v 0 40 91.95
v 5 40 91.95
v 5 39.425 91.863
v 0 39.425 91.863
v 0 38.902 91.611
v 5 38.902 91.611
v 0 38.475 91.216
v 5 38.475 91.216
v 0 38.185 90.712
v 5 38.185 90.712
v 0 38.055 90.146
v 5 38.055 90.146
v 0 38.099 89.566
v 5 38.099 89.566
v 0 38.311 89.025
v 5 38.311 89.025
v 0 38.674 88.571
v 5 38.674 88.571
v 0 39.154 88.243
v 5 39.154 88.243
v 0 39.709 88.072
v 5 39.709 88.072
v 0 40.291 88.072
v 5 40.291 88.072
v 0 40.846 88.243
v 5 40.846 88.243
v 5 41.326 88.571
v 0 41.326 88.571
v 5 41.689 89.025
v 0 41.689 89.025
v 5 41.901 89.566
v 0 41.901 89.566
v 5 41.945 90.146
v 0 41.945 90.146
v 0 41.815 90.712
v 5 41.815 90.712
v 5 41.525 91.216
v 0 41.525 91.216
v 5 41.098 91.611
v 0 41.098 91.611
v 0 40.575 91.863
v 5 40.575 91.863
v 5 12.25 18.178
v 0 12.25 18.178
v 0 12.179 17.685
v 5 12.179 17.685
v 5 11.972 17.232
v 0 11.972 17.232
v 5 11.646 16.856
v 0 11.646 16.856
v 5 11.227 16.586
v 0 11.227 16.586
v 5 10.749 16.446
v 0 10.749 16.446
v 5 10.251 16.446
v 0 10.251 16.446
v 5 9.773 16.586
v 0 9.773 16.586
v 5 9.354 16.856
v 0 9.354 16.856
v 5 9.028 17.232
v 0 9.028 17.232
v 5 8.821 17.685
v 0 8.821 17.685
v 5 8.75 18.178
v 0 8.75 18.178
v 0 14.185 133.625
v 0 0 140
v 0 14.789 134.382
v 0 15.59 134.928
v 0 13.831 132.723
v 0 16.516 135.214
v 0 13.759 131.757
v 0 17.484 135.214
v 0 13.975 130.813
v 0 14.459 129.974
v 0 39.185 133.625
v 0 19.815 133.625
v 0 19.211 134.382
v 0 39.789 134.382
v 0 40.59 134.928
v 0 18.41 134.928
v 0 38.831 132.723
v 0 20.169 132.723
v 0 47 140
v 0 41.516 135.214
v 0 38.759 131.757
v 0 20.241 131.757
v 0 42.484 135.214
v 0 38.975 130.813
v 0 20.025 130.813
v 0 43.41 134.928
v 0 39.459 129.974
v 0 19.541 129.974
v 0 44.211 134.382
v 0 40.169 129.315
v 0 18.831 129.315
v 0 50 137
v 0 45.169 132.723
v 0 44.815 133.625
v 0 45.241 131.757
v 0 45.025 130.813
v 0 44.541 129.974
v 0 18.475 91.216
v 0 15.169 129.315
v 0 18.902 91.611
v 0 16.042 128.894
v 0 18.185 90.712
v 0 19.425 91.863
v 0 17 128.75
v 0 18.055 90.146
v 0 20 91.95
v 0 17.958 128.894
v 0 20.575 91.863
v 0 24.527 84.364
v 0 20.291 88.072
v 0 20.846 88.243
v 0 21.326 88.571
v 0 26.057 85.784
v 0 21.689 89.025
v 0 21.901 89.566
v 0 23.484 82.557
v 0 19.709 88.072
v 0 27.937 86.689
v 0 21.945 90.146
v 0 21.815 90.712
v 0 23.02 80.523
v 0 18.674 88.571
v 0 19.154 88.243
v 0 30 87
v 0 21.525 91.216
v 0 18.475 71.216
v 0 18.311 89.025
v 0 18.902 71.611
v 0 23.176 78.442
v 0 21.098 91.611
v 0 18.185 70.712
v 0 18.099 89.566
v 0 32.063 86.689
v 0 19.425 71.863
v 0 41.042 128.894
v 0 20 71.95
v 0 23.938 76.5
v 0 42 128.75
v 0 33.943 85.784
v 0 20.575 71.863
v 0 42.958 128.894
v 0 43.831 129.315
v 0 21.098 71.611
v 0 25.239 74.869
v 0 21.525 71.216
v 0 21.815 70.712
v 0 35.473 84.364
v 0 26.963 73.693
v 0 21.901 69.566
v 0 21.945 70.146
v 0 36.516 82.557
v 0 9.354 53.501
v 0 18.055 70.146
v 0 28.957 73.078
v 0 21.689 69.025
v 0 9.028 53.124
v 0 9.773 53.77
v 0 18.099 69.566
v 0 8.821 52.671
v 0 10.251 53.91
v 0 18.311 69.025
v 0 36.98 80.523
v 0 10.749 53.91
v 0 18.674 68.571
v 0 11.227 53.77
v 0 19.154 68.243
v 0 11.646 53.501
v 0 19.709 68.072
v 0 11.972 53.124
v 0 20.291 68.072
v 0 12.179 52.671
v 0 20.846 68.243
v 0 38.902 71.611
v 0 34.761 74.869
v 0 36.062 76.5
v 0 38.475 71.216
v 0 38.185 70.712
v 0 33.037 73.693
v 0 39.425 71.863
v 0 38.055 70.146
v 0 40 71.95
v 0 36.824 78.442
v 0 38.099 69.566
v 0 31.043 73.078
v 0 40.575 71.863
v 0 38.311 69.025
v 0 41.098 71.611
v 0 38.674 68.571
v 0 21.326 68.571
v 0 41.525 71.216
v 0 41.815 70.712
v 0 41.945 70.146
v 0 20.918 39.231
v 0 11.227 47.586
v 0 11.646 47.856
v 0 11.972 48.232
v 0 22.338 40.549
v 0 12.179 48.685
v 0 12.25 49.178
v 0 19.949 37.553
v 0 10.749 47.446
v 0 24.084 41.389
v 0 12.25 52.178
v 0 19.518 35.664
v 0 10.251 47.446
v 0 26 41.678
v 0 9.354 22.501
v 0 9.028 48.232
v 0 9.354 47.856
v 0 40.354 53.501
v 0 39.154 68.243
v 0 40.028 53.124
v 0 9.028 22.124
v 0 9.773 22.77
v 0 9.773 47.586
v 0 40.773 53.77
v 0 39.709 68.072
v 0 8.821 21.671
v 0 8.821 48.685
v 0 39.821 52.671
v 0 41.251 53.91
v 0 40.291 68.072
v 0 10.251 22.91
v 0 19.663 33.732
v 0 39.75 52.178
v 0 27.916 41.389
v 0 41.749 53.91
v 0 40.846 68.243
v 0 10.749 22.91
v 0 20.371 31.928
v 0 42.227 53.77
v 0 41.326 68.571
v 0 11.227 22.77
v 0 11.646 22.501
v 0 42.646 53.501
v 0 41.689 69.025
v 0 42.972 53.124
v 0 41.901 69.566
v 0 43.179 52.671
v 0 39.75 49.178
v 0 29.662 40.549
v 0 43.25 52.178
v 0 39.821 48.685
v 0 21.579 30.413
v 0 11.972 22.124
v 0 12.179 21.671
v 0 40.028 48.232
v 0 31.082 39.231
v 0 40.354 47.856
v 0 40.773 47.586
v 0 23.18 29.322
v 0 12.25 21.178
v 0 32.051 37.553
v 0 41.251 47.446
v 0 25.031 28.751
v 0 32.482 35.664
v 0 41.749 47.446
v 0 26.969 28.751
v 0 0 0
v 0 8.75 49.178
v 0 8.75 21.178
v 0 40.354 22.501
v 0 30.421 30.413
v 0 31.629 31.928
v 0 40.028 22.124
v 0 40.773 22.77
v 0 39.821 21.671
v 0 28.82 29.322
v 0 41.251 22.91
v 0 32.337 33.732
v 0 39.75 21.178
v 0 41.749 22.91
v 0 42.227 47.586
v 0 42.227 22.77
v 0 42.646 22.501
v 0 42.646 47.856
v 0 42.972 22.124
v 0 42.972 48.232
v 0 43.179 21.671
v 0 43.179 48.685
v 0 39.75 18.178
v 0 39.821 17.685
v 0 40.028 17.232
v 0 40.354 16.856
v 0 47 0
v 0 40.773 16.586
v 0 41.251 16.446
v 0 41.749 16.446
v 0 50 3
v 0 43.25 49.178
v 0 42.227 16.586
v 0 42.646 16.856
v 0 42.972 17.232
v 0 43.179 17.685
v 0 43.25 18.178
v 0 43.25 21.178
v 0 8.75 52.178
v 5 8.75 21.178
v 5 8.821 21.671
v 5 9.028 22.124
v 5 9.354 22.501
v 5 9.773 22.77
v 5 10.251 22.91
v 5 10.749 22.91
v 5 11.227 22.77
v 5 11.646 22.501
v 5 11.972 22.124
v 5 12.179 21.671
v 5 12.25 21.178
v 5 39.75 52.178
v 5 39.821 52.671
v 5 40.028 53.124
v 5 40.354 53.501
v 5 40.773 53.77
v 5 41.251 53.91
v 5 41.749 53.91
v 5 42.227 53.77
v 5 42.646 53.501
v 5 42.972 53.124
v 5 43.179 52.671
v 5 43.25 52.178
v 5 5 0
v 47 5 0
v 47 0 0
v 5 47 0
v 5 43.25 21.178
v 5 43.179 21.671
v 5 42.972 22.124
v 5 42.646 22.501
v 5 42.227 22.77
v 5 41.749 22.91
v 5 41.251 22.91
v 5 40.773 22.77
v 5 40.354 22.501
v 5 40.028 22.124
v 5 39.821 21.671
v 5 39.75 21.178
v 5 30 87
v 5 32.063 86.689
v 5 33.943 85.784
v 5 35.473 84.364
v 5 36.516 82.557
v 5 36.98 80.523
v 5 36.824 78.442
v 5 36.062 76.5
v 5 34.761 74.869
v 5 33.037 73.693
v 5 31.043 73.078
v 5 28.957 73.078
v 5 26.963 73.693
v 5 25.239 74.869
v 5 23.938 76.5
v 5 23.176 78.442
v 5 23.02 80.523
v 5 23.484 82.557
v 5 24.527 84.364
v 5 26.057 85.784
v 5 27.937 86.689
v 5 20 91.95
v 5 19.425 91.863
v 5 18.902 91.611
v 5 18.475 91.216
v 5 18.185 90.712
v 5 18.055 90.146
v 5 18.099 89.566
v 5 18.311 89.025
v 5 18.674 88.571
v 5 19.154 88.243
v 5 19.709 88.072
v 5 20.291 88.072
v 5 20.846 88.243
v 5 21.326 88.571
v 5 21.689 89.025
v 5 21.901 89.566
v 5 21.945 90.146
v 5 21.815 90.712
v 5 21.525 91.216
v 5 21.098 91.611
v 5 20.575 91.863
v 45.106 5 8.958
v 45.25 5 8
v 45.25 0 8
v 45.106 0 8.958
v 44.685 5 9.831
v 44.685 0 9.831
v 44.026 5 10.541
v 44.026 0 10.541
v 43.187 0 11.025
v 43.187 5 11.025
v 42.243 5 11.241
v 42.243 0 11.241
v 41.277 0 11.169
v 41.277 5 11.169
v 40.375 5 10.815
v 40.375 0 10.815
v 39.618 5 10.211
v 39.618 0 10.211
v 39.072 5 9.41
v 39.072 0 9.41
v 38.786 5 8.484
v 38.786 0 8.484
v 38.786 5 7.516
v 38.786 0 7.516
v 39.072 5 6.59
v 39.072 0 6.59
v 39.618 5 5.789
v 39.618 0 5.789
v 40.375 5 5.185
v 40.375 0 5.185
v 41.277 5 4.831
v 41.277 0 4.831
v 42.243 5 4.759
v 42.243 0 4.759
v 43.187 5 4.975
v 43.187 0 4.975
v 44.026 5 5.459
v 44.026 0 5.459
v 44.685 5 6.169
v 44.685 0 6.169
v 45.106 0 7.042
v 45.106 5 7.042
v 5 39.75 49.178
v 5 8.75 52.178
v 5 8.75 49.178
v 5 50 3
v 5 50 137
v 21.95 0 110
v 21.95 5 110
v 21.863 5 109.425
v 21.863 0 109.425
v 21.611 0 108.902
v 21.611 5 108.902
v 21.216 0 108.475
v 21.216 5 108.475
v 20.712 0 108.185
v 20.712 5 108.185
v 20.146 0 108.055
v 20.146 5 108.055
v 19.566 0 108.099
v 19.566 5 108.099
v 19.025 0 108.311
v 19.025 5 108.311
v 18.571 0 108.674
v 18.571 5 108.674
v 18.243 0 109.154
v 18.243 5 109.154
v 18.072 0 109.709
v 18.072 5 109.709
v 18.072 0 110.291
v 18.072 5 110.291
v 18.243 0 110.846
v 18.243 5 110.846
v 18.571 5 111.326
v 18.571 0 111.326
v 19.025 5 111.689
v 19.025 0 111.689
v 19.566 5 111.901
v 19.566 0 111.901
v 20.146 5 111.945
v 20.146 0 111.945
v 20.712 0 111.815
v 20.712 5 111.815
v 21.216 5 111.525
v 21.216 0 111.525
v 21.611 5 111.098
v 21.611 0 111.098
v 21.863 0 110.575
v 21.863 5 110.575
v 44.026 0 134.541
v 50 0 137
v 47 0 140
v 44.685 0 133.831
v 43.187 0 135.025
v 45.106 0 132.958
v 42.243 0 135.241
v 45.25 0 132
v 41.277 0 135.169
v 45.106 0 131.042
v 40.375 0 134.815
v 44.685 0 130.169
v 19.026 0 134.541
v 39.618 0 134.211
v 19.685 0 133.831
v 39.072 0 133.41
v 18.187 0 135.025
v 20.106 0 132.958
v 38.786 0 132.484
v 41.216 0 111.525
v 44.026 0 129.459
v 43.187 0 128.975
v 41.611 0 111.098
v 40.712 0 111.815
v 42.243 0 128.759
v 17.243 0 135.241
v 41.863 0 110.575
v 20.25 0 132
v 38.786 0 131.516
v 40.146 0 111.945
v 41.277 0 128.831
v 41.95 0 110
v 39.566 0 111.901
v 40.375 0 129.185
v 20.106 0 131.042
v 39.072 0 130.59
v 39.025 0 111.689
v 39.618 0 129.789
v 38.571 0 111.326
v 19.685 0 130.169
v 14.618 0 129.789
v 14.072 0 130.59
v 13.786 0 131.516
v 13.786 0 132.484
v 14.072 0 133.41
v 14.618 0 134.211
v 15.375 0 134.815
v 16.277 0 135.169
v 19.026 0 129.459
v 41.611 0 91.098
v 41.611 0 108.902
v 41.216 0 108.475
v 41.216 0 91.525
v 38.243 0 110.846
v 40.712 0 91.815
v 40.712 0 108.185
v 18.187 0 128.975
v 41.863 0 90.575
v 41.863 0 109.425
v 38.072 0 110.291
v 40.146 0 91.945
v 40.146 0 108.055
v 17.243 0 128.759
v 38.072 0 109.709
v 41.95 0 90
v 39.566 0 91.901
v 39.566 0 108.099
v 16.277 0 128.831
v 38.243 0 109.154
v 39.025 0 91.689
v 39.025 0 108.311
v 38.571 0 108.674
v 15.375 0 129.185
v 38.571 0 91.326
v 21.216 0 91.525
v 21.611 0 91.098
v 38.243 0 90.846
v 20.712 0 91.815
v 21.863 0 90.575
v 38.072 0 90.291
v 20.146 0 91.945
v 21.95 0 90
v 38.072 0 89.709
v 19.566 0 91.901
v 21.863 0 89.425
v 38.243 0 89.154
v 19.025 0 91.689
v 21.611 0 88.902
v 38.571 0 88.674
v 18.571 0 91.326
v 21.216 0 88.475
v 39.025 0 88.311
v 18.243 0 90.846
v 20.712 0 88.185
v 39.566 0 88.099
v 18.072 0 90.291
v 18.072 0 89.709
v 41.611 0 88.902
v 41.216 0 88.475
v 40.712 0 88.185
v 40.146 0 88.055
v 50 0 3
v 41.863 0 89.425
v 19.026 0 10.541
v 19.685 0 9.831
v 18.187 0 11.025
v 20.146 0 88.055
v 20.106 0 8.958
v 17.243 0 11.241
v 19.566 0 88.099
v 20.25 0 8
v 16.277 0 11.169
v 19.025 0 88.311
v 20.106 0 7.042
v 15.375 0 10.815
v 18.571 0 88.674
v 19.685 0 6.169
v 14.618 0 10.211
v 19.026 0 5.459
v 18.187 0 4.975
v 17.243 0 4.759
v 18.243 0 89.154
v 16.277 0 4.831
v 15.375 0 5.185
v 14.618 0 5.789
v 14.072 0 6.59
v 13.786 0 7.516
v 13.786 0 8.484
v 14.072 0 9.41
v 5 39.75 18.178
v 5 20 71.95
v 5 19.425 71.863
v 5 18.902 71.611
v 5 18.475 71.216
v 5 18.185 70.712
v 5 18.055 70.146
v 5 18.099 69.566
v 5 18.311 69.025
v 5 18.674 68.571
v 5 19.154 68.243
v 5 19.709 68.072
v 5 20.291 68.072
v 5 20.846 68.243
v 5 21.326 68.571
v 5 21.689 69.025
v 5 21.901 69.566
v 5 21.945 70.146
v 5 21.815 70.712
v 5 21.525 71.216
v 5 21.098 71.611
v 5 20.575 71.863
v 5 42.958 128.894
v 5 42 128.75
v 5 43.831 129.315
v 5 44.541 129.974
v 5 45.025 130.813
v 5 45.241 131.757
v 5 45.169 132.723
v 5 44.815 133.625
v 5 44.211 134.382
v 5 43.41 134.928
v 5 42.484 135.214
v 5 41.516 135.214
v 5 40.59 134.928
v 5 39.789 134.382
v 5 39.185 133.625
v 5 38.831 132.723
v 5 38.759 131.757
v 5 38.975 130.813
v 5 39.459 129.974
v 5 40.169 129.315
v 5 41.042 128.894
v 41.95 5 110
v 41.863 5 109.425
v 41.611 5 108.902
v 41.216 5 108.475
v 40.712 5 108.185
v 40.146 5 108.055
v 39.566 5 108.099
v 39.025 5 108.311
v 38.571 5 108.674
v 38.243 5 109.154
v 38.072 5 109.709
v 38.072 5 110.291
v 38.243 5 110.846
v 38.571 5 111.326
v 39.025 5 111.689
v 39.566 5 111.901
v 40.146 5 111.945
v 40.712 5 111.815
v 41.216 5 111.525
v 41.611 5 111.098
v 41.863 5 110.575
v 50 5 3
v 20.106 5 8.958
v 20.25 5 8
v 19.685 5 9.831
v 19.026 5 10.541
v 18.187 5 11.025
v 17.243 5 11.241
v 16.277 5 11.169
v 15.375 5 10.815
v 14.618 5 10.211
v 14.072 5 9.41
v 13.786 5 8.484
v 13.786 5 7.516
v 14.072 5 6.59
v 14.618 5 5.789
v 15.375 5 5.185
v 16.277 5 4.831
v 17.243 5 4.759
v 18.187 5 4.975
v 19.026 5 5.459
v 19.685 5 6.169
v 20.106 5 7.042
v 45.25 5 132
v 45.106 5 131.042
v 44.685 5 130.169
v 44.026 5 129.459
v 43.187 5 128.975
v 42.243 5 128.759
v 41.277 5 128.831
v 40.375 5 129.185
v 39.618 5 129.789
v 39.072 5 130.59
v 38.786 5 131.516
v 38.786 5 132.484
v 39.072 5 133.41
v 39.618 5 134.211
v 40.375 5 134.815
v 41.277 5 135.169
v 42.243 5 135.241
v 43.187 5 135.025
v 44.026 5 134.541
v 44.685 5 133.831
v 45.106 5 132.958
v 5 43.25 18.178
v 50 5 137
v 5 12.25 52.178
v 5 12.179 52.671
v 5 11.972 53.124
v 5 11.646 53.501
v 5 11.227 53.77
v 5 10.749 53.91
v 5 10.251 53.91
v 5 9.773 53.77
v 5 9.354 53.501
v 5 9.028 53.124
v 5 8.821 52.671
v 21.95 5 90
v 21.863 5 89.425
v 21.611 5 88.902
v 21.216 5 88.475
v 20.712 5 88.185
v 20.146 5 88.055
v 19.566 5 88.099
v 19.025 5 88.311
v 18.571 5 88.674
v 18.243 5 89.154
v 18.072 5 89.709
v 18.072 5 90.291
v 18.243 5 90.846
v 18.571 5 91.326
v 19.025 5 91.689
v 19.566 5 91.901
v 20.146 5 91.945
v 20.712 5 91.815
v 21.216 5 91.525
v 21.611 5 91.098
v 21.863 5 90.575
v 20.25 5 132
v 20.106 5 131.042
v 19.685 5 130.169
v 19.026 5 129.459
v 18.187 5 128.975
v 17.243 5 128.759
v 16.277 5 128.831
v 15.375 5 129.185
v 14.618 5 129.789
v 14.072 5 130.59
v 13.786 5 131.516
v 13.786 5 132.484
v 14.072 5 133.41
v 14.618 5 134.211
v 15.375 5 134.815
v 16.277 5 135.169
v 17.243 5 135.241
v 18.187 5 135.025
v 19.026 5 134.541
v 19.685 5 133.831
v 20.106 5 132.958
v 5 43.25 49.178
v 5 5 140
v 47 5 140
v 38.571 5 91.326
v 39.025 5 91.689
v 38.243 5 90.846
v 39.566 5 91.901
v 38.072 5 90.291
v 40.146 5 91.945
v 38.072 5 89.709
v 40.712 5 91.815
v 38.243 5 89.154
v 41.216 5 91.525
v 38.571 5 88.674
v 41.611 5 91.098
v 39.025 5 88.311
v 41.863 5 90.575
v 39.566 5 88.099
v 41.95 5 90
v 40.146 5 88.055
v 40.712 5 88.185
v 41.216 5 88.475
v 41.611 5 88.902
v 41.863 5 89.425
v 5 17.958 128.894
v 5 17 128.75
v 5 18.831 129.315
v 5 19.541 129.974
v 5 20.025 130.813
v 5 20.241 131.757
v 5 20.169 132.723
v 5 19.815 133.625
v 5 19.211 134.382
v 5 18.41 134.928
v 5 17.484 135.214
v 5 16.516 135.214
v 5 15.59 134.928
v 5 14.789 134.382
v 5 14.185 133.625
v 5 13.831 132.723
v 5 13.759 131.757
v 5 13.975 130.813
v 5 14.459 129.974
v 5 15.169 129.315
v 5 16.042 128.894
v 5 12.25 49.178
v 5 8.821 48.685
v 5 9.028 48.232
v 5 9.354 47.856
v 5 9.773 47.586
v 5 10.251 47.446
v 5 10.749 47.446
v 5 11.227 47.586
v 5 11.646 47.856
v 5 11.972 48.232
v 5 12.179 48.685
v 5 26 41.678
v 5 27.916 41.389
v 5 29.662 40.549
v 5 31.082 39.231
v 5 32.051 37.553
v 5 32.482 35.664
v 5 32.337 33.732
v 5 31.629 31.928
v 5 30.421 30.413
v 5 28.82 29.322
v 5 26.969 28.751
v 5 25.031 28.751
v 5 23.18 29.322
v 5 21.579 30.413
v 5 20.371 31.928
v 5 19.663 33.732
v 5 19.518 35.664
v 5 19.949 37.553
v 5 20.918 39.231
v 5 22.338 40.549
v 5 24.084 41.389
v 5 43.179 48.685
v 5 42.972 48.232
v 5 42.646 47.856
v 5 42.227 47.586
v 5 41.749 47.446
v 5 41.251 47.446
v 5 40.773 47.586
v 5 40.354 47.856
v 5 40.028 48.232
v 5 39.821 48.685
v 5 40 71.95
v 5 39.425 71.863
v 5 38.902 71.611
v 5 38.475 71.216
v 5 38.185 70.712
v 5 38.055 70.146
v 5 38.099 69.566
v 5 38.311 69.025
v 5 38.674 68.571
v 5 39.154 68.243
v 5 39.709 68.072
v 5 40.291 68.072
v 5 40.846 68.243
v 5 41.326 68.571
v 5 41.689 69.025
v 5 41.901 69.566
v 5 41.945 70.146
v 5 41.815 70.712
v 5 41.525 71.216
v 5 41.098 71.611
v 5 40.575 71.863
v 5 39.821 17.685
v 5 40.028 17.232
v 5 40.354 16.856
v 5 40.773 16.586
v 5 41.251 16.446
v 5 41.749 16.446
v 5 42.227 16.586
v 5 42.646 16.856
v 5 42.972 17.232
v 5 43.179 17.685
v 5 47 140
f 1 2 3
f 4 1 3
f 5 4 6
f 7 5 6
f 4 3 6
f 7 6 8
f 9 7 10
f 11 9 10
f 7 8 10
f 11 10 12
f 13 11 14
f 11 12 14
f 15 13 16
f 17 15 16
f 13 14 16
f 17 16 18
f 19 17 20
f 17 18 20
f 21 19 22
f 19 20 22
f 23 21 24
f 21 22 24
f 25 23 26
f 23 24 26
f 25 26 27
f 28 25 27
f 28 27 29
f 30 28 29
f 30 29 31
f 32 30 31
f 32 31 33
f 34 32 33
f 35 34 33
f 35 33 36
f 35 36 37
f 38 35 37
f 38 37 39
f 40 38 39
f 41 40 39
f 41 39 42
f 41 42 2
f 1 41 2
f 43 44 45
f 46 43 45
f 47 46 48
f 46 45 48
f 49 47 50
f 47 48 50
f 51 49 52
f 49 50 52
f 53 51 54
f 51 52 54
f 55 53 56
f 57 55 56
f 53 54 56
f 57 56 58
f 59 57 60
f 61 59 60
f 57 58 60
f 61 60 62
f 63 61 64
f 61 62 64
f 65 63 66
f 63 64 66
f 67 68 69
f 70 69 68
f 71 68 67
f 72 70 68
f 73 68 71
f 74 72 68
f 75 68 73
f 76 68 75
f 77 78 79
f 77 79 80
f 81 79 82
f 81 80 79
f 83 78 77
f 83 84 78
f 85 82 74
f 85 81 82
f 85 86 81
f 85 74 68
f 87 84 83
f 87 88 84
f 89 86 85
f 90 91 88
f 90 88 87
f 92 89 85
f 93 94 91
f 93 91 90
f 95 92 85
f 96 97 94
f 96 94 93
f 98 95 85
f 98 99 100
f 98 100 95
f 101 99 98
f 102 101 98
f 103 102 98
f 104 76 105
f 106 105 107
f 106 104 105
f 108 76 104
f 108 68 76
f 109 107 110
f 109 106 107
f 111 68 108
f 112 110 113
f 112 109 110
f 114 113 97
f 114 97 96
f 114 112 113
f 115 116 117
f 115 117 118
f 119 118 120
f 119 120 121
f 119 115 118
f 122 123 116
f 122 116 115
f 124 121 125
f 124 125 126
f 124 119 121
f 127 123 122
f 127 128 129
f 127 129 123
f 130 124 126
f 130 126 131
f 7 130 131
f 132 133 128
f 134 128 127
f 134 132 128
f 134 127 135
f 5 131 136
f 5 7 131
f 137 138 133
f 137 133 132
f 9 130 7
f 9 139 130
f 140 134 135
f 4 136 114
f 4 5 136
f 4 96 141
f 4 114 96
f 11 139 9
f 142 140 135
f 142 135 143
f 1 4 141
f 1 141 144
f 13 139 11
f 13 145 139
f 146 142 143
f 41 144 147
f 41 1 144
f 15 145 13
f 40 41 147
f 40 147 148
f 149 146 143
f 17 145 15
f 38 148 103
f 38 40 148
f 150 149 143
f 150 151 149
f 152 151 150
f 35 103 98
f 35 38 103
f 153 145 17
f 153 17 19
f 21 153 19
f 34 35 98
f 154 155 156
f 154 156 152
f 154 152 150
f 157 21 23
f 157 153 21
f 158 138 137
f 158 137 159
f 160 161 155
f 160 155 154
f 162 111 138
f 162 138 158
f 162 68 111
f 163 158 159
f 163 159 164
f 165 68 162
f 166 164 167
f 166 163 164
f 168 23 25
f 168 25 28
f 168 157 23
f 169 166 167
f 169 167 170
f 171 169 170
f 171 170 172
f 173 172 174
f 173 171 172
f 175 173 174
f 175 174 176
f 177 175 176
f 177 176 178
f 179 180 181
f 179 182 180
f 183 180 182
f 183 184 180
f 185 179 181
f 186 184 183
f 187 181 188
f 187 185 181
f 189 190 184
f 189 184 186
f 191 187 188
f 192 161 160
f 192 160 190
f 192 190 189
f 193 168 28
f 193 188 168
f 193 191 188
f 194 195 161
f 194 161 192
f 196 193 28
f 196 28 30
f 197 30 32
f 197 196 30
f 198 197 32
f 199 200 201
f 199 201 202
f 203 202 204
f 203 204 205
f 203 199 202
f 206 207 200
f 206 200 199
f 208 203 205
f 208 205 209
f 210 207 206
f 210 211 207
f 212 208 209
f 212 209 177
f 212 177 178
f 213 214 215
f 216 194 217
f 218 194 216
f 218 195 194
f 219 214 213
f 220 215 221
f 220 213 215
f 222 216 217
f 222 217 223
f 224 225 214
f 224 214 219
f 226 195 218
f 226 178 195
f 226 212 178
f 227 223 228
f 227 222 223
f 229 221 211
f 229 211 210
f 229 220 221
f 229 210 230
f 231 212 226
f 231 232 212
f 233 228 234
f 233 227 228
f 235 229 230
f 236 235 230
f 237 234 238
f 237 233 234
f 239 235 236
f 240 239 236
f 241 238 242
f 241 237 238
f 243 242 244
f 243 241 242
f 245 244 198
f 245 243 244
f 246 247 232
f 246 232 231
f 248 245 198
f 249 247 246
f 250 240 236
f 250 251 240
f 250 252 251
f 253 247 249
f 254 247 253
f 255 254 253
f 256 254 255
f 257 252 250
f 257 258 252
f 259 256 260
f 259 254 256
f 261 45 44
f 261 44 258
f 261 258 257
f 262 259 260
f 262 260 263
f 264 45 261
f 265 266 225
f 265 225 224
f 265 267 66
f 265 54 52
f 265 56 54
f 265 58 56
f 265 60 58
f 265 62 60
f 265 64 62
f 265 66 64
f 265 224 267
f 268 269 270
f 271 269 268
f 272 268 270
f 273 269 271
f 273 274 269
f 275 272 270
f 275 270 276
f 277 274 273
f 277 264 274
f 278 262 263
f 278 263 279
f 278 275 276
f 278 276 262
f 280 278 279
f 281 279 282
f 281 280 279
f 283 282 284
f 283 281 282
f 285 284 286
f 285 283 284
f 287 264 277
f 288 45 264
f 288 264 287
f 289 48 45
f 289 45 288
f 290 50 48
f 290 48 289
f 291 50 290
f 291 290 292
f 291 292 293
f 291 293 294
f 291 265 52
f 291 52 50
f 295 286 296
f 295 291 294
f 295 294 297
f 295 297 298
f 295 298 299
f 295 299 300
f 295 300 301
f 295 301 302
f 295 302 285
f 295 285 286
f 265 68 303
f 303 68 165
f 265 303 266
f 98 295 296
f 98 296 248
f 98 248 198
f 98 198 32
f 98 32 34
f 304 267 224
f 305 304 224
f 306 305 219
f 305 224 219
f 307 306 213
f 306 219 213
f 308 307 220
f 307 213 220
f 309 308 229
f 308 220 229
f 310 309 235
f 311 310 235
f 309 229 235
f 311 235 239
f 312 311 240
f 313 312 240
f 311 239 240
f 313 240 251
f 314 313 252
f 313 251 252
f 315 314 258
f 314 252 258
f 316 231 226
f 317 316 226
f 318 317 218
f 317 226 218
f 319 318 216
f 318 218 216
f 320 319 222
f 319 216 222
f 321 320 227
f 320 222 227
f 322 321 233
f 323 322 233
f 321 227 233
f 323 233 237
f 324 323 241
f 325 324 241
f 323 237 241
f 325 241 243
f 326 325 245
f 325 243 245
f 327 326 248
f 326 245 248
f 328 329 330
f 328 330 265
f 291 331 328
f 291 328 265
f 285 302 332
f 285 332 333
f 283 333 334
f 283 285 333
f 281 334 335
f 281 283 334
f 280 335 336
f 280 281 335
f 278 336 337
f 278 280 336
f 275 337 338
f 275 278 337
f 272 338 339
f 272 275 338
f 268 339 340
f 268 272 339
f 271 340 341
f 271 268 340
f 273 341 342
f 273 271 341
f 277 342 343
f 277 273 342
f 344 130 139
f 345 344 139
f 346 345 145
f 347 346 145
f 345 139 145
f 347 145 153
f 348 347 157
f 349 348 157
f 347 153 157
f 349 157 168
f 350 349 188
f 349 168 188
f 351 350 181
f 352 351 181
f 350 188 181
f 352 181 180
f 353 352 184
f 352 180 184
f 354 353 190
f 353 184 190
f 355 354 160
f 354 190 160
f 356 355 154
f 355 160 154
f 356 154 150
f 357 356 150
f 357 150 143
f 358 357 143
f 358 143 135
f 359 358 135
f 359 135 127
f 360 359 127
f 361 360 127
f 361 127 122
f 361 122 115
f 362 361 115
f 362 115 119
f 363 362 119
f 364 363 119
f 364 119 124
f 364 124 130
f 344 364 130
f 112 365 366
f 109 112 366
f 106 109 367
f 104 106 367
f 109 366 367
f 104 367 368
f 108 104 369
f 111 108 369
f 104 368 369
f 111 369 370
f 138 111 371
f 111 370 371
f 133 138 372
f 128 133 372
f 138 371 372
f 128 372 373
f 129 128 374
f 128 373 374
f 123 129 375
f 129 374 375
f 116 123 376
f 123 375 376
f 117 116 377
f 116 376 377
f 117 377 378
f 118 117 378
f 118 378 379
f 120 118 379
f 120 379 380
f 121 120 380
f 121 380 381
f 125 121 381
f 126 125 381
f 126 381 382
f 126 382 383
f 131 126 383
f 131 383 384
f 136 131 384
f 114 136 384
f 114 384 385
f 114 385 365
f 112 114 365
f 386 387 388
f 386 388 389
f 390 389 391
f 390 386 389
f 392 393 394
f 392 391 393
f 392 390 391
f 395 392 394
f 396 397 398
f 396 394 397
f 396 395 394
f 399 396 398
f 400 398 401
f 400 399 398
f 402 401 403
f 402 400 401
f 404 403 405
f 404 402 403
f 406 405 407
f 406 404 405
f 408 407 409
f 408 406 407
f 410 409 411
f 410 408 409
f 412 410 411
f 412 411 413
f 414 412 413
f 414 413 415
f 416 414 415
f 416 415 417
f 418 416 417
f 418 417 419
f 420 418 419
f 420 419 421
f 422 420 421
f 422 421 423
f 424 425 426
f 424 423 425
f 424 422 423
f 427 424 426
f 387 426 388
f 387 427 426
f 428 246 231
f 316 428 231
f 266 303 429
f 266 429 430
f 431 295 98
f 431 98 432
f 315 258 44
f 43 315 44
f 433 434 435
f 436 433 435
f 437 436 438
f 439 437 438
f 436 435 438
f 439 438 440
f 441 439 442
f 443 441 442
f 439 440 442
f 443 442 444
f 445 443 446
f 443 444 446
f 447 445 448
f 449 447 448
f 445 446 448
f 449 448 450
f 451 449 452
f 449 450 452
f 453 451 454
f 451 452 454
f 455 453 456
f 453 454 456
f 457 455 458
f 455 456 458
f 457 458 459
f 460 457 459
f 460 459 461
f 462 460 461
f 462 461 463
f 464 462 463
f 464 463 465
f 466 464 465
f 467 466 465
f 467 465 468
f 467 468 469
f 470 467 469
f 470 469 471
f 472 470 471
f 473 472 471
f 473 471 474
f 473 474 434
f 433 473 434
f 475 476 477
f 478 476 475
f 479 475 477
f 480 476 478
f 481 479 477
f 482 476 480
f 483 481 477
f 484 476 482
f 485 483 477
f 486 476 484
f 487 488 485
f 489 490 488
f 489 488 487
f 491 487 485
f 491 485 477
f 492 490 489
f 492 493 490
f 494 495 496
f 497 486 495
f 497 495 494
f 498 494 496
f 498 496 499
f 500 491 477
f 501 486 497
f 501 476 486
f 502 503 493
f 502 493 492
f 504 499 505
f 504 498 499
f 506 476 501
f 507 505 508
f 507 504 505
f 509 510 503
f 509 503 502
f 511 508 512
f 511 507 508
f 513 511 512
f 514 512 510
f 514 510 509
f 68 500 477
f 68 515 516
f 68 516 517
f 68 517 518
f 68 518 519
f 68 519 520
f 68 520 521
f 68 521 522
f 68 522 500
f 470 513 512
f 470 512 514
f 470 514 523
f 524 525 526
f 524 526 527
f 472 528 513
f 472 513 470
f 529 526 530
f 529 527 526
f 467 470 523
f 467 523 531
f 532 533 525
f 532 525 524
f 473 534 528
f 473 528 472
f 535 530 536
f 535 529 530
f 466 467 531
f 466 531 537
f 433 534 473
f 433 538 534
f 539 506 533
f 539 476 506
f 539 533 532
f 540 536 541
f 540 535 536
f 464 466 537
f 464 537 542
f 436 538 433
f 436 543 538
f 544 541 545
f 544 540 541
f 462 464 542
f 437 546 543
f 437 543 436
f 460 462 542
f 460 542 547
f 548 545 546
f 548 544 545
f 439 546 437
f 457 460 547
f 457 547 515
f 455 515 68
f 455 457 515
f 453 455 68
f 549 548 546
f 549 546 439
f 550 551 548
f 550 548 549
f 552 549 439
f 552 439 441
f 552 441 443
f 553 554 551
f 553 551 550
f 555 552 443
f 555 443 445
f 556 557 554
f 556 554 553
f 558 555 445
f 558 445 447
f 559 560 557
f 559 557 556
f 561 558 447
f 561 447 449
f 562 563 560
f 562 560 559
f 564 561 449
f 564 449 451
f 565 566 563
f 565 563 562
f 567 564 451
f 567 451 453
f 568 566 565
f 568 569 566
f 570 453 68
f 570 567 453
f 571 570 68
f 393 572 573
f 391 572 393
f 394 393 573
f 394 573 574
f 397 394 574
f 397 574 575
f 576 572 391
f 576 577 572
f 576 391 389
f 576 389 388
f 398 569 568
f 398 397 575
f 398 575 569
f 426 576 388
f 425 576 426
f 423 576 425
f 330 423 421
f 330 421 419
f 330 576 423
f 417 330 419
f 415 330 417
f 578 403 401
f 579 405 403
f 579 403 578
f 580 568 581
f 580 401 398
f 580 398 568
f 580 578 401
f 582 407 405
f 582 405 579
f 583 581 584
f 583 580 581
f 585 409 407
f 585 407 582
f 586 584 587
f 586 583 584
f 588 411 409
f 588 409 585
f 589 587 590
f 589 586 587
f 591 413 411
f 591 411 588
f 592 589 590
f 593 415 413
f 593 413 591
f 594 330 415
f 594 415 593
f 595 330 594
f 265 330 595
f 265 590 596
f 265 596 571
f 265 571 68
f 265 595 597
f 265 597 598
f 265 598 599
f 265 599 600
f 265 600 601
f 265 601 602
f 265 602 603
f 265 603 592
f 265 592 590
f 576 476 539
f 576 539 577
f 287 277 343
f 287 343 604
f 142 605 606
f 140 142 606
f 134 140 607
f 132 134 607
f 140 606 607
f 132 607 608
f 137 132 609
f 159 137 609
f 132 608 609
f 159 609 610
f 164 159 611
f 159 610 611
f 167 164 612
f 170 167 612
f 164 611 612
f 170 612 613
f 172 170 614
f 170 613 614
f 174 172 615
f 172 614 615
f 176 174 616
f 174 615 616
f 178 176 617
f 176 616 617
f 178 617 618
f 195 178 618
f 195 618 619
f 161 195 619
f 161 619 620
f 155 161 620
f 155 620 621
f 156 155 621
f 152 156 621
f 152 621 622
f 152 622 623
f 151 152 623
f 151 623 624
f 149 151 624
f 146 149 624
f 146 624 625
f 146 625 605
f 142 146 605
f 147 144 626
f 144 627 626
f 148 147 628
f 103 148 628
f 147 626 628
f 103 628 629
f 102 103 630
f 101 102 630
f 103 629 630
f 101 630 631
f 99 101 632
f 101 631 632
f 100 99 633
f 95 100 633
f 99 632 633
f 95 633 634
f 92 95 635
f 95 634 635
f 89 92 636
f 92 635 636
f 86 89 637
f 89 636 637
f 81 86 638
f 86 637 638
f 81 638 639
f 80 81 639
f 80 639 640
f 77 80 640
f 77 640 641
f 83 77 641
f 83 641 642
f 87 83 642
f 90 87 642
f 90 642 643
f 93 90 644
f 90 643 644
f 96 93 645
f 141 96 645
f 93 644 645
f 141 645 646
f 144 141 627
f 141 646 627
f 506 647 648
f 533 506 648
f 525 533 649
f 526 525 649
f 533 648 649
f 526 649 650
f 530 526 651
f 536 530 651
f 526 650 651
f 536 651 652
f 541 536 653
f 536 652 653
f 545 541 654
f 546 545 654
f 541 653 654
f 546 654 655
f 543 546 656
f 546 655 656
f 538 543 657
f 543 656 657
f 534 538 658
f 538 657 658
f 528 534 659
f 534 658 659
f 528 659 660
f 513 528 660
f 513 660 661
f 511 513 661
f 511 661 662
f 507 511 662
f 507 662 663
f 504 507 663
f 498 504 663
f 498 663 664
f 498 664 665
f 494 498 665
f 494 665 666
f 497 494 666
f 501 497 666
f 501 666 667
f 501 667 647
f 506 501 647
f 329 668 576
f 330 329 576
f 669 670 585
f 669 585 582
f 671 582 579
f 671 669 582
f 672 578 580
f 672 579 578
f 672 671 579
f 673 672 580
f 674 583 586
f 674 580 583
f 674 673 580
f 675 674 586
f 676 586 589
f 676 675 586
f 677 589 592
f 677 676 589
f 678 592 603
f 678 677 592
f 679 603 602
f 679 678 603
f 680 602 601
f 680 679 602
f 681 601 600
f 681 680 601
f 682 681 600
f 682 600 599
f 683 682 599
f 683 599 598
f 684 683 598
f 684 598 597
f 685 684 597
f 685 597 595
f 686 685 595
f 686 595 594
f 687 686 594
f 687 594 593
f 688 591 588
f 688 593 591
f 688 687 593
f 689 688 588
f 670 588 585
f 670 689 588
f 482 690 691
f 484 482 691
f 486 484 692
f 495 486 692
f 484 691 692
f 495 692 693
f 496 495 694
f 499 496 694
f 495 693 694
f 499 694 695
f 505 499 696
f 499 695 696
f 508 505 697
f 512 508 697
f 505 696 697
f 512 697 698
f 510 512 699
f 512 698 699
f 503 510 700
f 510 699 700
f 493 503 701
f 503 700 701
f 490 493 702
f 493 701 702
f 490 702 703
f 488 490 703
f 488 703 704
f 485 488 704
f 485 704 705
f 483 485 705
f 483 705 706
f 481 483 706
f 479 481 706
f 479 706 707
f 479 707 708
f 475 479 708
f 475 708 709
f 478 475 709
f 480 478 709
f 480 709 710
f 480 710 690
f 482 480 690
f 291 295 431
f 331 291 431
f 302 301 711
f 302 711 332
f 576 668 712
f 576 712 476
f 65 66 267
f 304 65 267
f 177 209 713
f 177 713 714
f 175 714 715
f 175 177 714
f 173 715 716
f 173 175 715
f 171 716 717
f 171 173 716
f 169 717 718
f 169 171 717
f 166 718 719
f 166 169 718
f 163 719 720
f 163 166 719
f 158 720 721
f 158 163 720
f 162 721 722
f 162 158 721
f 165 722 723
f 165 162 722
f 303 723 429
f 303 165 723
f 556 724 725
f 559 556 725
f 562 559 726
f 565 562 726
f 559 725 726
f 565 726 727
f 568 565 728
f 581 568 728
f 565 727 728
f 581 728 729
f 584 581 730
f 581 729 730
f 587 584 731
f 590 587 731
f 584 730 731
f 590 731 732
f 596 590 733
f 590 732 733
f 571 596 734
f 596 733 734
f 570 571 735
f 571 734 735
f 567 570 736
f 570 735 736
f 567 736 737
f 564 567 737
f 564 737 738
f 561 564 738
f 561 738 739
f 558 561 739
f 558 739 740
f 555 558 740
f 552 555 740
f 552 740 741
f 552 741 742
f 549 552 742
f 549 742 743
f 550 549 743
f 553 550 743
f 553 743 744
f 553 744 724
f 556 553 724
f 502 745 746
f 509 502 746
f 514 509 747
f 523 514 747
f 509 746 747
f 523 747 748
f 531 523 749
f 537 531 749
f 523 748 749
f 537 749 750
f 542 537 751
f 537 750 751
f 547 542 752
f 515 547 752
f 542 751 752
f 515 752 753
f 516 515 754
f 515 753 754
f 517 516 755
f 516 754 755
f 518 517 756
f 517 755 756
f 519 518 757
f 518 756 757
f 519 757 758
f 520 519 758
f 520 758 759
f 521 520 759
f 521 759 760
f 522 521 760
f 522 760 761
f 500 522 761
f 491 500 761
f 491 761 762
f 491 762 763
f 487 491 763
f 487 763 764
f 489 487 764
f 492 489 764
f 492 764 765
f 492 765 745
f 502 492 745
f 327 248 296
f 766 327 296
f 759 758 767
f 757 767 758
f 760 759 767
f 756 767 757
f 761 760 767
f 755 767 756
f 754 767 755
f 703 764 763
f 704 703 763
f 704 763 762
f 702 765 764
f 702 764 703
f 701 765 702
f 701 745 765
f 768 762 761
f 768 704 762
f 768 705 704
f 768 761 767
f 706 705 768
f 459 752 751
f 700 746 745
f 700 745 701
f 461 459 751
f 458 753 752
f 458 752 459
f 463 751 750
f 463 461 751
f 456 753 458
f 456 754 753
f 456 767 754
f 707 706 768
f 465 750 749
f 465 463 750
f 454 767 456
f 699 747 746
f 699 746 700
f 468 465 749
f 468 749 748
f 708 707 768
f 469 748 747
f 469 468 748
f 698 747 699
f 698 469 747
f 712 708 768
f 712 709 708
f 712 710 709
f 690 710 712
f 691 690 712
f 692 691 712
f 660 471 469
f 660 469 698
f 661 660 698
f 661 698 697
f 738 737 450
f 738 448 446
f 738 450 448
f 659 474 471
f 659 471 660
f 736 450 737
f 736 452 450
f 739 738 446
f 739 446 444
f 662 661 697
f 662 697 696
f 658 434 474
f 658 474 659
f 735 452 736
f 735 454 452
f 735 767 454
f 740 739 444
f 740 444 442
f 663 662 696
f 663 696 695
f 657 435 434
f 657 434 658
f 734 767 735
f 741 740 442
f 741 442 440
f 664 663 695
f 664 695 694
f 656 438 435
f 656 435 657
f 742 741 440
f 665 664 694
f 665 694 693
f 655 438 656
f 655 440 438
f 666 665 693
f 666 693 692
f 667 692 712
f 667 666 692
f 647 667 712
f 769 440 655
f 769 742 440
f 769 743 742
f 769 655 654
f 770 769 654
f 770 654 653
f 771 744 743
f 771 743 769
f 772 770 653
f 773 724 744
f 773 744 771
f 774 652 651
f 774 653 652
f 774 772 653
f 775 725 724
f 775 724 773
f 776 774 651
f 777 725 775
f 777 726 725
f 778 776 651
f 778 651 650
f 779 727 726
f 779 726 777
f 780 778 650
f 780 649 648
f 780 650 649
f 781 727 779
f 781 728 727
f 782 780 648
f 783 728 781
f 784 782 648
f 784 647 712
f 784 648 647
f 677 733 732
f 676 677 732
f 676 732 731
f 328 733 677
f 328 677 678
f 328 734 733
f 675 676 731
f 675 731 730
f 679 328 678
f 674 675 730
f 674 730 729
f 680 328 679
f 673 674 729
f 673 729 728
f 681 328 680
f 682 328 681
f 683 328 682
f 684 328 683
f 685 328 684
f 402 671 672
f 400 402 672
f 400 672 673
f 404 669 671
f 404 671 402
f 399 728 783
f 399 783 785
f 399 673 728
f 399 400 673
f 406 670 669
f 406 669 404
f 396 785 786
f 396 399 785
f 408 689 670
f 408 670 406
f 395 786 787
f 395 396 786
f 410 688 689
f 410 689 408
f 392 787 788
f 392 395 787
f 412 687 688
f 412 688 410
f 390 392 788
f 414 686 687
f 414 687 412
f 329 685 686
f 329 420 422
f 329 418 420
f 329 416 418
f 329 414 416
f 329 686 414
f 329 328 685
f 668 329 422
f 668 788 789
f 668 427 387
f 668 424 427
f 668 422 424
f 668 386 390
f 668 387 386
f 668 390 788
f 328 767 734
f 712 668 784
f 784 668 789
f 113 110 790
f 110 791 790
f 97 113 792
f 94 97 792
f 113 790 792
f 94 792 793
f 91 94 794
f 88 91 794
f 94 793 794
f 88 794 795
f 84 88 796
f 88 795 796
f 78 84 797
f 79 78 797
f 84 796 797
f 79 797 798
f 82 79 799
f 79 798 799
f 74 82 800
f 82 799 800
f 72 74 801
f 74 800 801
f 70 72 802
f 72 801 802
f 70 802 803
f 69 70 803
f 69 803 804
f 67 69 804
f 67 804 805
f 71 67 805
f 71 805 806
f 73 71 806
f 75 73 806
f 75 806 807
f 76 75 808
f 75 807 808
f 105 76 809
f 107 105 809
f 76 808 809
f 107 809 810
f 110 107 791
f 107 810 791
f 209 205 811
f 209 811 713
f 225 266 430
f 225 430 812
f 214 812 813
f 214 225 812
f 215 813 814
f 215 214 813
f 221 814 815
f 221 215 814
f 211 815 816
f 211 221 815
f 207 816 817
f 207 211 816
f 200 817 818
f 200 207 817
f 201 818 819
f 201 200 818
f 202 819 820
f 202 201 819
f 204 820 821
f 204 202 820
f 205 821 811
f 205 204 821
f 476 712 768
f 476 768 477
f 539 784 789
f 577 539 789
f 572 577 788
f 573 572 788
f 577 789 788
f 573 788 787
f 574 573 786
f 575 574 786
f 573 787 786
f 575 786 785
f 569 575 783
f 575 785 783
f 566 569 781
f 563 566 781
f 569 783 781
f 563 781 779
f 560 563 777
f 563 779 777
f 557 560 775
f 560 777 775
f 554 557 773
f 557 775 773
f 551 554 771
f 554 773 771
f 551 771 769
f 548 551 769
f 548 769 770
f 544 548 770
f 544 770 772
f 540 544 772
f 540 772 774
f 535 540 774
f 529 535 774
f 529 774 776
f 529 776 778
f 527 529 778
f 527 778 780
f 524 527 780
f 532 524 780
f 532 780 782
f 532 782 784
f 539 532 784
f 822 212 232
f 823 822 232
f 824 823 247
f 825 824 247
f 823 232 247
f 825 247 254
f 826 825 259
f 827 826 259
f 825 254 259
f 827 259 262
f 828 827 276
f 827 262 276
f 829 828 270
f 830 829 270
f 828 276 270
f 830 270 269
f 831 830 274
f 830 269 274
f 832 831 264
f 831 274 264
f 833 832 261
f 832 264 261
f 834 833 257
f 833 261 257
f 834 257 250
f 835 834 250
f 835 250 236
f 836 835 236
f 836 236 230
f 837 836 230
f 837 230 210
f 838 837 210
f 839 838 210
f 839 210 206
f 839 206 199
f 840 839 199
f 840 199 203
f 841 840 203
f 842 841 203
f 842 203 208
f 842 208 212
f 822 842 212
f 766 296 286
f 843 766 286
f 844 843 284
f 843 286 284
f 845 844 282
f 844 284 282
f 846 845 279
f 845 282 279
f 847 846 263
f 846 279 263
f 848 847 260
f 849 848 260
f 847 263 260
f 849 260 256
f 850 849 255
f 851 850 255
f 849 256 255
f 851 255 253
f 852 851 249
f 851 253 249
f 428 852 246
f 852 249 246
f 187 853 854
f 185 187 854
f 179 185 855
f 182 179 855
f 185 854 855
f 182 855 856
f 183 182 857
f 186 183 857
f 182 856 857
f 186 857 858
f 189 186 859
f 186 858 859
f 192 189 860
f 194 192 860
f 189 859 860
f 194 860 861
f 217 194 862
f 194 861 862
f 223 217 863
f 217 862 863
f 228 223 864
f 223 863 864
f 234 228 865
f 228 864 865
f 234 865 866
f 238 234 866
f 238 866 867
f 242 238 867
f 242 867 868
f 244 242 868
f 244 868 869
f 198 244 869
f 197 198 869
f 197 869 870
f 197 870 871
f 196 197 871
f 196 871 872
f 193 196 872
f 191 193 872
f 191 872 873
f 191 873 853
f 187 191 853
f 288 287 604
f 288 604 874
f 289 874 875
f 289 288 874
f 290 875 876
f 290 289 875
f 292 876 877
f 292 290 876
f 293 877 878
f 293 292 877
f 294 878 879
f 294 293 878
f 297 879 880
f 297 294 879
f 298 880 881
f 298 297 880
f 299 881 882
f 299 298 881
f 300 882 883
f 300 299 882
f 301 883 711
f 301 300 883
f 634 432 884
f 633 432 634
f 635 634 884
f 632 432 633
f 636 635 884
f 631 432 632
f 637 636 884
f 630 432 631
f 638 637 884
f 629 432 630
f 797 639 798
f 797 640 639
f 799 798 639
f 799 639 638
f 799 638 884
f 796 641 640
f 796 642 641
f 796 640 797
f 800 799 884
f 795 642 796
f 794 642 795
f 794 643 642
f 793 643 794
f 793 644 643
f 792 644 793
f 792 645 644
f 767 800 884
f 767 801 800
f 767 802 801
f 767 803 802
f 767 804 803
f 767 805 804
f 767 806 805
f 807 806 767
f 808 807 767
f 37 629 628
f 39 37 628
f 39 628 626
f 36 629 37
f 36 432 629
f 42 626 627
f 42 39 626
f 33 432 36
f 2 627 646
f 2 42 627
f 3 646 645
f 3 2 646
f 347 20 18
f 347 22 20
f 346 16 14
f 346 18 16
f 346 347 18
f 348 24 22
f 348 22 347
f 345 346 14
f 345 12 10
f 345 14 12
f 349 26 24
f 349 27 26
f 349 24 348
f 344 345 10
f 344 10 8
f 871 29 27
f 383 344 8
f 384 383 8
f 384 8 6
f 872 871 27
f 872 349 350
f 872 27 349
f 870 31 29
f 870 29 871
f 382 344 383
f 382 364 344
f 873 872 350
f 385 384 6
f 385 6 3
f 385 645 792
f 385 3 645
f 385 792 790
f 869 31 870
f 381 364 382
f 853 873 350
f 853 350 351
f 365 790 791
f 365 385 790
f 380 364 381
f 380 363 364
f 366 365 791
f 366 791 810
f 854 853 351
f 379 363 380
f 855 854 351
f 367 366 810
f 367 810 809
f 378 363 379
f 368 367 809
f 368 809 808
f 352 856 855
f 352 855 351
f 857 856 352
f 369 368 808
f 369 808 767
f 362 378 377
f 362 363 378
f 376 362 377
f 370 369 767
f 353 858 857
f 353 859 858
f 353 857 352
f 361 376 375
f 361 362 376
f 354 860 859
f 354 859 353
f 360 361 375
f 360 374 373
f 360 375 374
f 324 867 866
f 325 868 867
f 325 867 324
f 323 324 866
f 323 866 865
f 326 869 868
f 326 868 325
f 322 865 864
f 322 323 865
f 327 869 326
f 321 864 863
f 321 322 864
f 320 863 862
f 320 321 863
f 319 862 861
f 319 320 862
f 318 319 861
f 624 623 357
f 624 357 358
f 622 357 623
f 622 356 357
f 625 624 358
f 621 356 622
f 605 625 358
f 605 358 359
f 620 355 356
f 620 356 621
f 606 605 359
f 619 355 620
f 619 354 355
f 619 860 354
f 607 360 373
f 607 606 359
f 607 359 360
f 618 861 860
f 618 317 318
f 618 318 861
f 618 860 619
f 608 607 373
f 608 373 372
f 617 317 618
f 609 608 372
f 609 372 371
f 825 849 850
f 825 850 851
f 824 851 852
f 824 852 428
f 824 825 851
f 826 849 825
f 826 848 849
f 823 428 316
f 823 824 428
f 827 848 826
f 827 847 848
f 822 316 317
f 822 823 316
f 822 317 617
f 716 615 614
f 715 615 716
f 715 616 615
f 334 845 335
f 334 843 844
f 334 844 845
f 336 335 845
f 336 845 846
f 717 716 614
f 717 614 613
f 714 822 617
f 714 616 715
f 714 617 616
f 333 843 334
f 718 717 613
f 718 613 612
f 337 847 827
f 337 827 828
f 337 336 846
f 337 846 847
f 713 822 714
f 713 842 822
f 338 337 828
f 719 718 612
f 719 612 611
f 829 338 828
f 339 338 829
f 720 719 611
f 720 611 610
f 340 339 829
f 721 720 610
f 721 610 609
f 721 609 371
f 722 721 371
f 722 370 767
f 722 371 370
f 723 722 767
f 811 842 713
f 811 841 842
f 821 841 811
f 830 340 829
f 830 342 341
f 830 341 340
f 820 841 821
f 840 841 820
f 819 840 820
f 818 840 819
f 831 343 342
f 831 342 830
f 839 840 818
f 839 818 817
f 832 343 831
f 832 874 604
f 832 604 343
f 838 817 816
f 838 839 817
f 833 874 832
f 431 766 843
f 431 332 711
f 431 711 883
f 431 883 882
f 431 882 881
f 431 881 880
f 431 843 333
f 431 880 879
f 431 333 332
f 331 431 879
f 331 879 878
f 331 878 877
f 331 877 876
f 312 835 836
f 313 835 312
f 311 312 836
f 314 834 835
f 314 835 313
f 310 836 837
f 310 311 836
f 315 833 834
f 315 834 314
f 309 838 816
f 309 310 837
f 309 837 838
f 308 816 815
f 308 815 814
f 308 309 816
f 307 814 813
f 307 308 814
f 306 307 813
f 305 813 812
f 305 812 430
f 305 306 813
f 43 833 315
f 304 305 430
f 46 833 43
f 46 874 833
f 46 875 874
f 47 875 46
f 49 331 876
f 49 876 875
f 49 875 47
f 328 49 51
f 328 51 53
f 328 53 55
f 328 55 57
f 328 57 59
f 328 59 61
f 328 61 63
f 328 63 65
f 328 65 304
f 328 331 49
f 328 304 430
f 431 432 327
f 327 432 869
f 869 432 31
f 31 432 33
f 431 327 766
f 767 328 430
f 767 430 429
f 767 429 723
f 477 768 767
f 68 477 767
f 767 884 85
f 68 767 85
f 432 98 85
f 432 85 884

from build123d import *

# Parameters (mm, degrees)
ESTRUSIONE_ESTRUSIONE1_DEPTH = 140
FORO_6_5_6_5_1_D             = 6.5
FORO_6_5_6_5_2_D             = 6.5
FORO_6_5_6_5_2_DEPTH         = 5
FORO_6_5_6_5_2_TIP           = 1.952797012
TAGLIO_ESTRUSIONE3_REACH     = 52
SCHIZZO10_R                  = 7
TAGLIO_ESTRUSIONE6_REACH     = 52
SCHIZZO13_R                  = 6.5
SMUSSO1_SIZE                 = 3
M3_5_CLEARANCE_HOLE1_D       = 3.9
M3_5_CLEARANCE_HOLE2_D       = 3.9


with BuildPart() as part:
    # Schizzo1 → Estrusione-Estrusione1 (new body)
    with BuildSketch(Plane.XY):
        Polygon((0, 0), (0, 50), (5, 50), (5, 5), (50, 5), (50, 0), align=None)
    extrude(amount=ESTRUSIONE_ESTRUSIONE1_DEPTH)

    # Foro Ø6.5 (6.5)-1 (through all)
    with Locations(Plane(origin=(0, 0, 0), x_dir=(-1, 0, 0), z_dir=(0, -1, 0))):
        with Locations((-17, -132), (-42, -132)):
            foro_6_5_6_5_1 = Hole(FORO_6_5_6_5_1_D / 2)

    # Foro Ø6.5 (6.5)-2
    with Locations(Plane.ZY):
        with Locations((132, 42), (132, 17)):
            Hole(FORO_6_5_6_5_2_D / 2, depth=FORO_6_5_6_5_2_DEPTH)
            with Locations((0, 0, -(FORO_6_5_6_5_2_DEPTH + FORO_6_5_6_5_2_TIP / 2))):  # 118° drill point
                Cone(0, FORO_6_5_6_5_2_D / 2, FORO_6_5_6_5_2_TIP, mode=Mode.SUBTRACT)

    # Specchia1: Foro Ø6.5 (6.5)-1 across plane
    add(foro_6_5_6_5_1.mirror(Plane.XY.offset(70)), mode=Mode.SUBTRACT)

    # Schizzo10 → Taglio-Estrusione3 (cut, up to next)
    with BuildSketch(Plane.ZY, mode=Mode.PRIVATE) as taglio_estrusione3_sk1:
        with Locations((80, 30)):
            Circle(SCHIZZO10_R)
    taglio_estrusione3_tool1 = extrude(taglio_estrusione3_sk1.sketch, amount=-TAGLIO_ESTRUSIONE3_REACH, mode=Mode.PRIVATE) & part.part
    add(taglio_estrusione3_tool1.solids().sort_by_distance((0, 30, 80))[0], mode=Mode.SUBTRACT)

    # Schizzo13 → Taglio-Estrusione6 (cut, up to next)
    with BuildSketch(Plane.ZY, mode=Mode.PRIVATE) as taglio_estrusione6_sk1:
        with Locations((35.178130338, 26)):
            Circle(SCHIZZO13_R)
    taglio_estrusione6_tool1 = extrude(taglio_estrusione6_sk1.sketch, amount=-TAGLIO_ESTRUSIONE6_REACH, mode=Mode.PRIVATE) & part.part
    add(taglio_estrusione6_tool1.solids().sort_by_distance((0, 26, 35.17813))[0], mode=Mode.SUBTRACT)
    # Schizzo13 → Taglio-Estrusione6 (cut, up to next)
    with BuildSketch(Plane.ZY, mode=Mode.PRIVATE) as taglio_estrusione6_sk2:
        with BuildLine():
            Line((18.178130338, 43.25), (21.178130338, 43.25))
            ThreePointArc((21.178130338, 43.25), (22.928130338, 41.5), (21.178130338, 39.75))
            Line((21.178130338, 39.75), (18.178130338, 39.75))
            ThreePointArc((18.178130338, 39.75), (16.428130338, 41.5), (18.178130338, 43.25))
        make_face()
    taglio_estrusione6_tool2 = extrude(taglio_estrusione6_sk2.sketch, amount=-TAGLIO_ESTRUSIONE6_REACH, mode=Mode.PRIVATE) & part.part
    add(taglio_estrusione6_tool2.solids().sort_by_distance((0, 41.5, 19.67813))[0], mode=Mode.SUBTRACT)
    # Schizzo13 → Taglio-Estrusione6 (cut, up to next)
    with BuildSketch(Plane.ZY, mode=Mode.PRIVATE) as taglio_estrusione6_sk3:
        with BuildLine():
            Line((18.178130338, 8.75), (21.178130338, 8.75))
            ThreePointArc((21.178130338, 8.75), (22.928130338, 10.5), (21.178130338, 12.25))
            Line((21.178130338, 12.25), (18.178130338, 12.25))
            ThreePointArc((18.178130338, 12.25), (16.428130338, 10.5), (18.178130338, 8.75))
        make_face()
    taglio_estrusione6_tool3 = extrude(taglio_estrusione6_sk3.sketch, amount=-TAGLIO_ESTRUSIONE6_REACH, mode=Mode.PRIVATE) & part.part
    add(taglio_estrusione6_tool3.solids().sort_by_distance((0, 10.5, 19.67813))[0], mode=Mode.SUBTRACT)
    # Schizzo13 → Taglio-Estrusione6 (cut, up to next)
    with BuildSketch(Plane.ZY, mode=Mode.PRIVATE) as taglio_estrusione6_sk4:
        with BuildLine():
            Line((52.178130338, 43.25), (49.178130338, 43.25))
            ThreePointArc((49.178130338, 43.25), (47.428130338, 41.5), (49.178130338, 39.75))
            Line((49.178130338, 39.75), (52.178130338, 39.75))
            ThreePointArc((52.178130338, 39.75), (53.928130338, 41.5), (52.178130338, 43.25))
        make_face()
    taglio_estrusione6_tool4 = extrude(taglio_estrusione6_sk4.sketch, amount=-TAGLIO_ESTRUSIONE6_REACH, mode=Mode.PRIVATE) & part.part
    add(taglio_estrusione6_tool4.solids().sort_by_distance((0, 41.5, 50.67813))[0], mode=Mode.SUBTRACT)
    # Schizzo13 → Taglio-Estrusione6 (cut, up to next)
    with BuildSketch(Plane.ZY, mode=Mode.PRIVATE) as taglio_estrusione6_sk5:
        with BuildLine():
            Line((52.178130338, 8.75), (49.178130338, 8.75))
            ThreePointArc((49.178130338, 8.75), (47.428130338, 10.5), (49.178130338, 12.25))
            Line((49.178130338, 12.25), (52.178130338, 12.25))
            ThreePointArc((52.178130338, 12.25), (53.928130338, 10.5), (52.178130338, 8.75))
        make_face()
    taglio_estrusione6_tool5 = extrude(taglio_estrusione6_sk5.sketch, amount=-TAGLIO_ESTRUSIONE6_REACH, mode=Mode.PRIVATE) & part.part
    add(taglio_estrusione6_tool5.solids().sort_by_distance((0, 10.5, 50.67813))[0], mode=Mode.SUBTRACT)

    # Smusso1
    smusso1_edges = [part.edges().sort_by_distance(p)[0] for p in [
        (2.5, 50, 140),
        (2.5, 50, 0),
        (50, 2.5, 140),
        (50, 2.5, 0),
    ]]
    chamfer(smusso1_edges, length=SMUSSO1_SIZE)

    # M3.5 Clearance Hole1 (through all)
    with Locations(Plane(origin=(0, 40, 70), x_dir=(0, 0, -1), z_dir=(-1, 0, 0))):
        with Locations((0, 0), (-20, 0), (-20, 20), (0, 20)):
            Hole(M3_5_CLEARANCE_HOLE1_D / 2)

    # M3.5 Clearance Hole2 (through all)
    with Locations(Plane(origin=(20, 0, 110), x_dir=(-1, 0, 0), z_dir=(0, -1, 0))):
        with Locations((0, 0), (-20, 0), (-20, 20), (0, 20)):
            Hole(M3_5_CLEARANCE_HOLE2_D / 2)


solid = part.part
